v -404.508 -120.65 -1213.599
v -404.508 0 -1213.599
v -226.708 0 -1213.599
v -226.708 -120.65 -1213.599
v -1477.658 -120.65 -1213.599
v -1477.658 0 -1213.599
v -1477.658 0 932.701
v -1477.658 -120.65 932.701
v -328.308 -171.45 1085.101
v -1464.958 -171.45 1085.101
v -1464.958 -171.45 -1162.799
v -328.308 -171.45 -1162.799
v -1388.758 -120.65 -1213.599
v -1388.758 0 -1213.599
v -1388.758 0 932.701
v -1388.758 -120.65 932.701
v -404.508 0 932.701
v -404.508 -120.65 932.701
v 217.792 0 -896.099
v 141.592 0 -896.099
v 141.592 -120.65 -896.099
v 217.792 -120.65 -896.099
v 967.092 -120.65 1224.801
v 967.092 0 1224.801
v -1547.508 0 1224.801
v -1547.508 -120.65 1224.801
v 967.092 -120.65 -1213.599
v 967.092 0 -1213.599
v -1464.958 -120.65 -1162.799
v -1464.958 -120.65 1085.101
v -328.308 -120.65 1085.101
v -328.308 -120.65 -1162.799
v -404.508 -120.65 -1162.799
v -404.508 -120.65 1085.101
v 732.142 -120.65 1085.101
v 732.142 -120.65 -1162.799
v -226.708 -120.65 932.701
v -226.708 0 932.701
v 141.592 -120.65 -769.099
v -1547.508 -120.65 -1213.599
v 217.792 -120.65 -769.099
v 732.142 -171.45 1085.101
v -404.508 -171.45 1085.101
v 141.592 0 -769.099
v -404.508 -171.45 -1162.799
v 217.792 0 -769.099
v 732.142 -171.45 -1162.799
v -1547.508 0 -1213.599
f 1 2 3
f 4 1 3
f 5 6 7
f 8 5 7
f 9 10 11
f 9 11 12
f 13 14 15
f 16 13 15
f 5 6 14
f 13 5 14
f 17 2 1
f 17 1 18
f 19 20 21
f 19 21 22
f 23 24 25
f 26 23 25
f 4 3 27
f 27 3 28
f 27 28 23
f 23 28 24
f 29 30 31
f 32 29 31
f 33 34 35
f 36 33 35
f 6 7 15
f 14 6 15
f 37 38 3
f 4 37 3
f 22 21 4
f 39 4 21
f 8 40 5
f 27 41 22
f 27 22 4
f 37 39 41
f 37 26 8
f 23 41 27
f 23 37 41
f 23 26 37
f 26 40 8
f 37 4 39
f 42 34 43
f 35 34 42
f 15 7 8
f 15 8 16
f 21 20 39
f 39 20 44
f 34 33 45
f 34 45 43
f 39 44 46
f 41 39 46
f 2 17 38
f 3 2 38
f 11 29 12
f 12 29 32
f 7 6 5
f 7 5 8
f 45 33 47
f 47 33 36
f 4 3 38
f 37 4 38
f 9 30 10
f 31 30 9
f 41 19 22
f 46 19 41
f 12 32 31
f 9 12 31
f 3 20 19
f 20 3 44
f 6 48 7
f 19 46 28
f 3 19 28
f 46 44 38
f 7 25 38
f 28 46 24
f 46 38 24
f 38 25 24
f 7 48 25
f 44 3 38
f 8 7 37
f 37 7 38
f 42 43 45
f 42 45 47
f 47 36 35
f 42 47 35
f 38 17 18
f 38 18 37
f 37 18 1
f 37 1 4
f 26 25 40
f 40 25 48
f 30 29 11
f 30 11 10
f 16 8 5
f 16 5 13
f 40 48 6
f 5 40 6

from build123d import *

# Parameters (mm, degrees)
F0_W     = 76.2
F0_H     = 127
F1_DEPTH = 120.65
F2_W     = 88.9
F2_H     = 2146.3
F2_W_2   = 177.8
F3_DEPTH = 120.65
F4_W     = 1136.65
F4_H     = 2247.9
F5_DEPTH = 50.8
F6_W     = 1136.65
F6_H     = 2247.9
F7_DEPTH = 50.8


with BuildPart() as f1:
    # F0 (on Front) → F1 (new body)
    with BuildSketch(Plane.XZ):
        Polygon((967.091514, 1224.801106), (-1547.508486, 1224.801106), (-1547.508486, -1213.598894), (-1477.658486, -1213.598894), (-1477.658486, 932.701106), (-226.708486, 932.701106), (-226.708486, -1213.598894), (967.091514, -1213.598894), align=None)
        with Locations((179.691514, -832.598894)):
            Rectangle(F0_W, F0_H, mode=Mode.SUBTRACT)
    extrude(amount=F1_DEPTH)


with BuildPart() as f3:
    # F2 (on Front) → F3 (new body, through all)
    with BuildSketch(Plane.XZ):
        with Locations((-1433.208486, -140.448894)):
            Rectangle(F2_W, F2_H)
        with Locations((-315.608486, -140.448894)):
            Rectangle(F2_W_2, F2_H)
    extrude(amount=F3_DEPTH)


with BuildPart() as f5:
    # F4 (on face) → F5 (new body)
    with BuildSketch(Plane.XZ.offset(120.65)):
        with Locations((-896.633486, -38.848894)):
            Rectangle(F4_W, F4_H)
    extrude(amount=F5_DEPTH)


with BuildPart() as f7:
    # F6 (on face) → F7 (new body)
    with BuildSketch(Plane.XZ.offset(120.65)):
        with Locations((163.816514, -38.848894)):
            Rectangle(F6_W, F6_H)
    extrude(amount=F7_DEPTH)


solid = Compound([f1.part, f3.part, f5.part, f7.part])
